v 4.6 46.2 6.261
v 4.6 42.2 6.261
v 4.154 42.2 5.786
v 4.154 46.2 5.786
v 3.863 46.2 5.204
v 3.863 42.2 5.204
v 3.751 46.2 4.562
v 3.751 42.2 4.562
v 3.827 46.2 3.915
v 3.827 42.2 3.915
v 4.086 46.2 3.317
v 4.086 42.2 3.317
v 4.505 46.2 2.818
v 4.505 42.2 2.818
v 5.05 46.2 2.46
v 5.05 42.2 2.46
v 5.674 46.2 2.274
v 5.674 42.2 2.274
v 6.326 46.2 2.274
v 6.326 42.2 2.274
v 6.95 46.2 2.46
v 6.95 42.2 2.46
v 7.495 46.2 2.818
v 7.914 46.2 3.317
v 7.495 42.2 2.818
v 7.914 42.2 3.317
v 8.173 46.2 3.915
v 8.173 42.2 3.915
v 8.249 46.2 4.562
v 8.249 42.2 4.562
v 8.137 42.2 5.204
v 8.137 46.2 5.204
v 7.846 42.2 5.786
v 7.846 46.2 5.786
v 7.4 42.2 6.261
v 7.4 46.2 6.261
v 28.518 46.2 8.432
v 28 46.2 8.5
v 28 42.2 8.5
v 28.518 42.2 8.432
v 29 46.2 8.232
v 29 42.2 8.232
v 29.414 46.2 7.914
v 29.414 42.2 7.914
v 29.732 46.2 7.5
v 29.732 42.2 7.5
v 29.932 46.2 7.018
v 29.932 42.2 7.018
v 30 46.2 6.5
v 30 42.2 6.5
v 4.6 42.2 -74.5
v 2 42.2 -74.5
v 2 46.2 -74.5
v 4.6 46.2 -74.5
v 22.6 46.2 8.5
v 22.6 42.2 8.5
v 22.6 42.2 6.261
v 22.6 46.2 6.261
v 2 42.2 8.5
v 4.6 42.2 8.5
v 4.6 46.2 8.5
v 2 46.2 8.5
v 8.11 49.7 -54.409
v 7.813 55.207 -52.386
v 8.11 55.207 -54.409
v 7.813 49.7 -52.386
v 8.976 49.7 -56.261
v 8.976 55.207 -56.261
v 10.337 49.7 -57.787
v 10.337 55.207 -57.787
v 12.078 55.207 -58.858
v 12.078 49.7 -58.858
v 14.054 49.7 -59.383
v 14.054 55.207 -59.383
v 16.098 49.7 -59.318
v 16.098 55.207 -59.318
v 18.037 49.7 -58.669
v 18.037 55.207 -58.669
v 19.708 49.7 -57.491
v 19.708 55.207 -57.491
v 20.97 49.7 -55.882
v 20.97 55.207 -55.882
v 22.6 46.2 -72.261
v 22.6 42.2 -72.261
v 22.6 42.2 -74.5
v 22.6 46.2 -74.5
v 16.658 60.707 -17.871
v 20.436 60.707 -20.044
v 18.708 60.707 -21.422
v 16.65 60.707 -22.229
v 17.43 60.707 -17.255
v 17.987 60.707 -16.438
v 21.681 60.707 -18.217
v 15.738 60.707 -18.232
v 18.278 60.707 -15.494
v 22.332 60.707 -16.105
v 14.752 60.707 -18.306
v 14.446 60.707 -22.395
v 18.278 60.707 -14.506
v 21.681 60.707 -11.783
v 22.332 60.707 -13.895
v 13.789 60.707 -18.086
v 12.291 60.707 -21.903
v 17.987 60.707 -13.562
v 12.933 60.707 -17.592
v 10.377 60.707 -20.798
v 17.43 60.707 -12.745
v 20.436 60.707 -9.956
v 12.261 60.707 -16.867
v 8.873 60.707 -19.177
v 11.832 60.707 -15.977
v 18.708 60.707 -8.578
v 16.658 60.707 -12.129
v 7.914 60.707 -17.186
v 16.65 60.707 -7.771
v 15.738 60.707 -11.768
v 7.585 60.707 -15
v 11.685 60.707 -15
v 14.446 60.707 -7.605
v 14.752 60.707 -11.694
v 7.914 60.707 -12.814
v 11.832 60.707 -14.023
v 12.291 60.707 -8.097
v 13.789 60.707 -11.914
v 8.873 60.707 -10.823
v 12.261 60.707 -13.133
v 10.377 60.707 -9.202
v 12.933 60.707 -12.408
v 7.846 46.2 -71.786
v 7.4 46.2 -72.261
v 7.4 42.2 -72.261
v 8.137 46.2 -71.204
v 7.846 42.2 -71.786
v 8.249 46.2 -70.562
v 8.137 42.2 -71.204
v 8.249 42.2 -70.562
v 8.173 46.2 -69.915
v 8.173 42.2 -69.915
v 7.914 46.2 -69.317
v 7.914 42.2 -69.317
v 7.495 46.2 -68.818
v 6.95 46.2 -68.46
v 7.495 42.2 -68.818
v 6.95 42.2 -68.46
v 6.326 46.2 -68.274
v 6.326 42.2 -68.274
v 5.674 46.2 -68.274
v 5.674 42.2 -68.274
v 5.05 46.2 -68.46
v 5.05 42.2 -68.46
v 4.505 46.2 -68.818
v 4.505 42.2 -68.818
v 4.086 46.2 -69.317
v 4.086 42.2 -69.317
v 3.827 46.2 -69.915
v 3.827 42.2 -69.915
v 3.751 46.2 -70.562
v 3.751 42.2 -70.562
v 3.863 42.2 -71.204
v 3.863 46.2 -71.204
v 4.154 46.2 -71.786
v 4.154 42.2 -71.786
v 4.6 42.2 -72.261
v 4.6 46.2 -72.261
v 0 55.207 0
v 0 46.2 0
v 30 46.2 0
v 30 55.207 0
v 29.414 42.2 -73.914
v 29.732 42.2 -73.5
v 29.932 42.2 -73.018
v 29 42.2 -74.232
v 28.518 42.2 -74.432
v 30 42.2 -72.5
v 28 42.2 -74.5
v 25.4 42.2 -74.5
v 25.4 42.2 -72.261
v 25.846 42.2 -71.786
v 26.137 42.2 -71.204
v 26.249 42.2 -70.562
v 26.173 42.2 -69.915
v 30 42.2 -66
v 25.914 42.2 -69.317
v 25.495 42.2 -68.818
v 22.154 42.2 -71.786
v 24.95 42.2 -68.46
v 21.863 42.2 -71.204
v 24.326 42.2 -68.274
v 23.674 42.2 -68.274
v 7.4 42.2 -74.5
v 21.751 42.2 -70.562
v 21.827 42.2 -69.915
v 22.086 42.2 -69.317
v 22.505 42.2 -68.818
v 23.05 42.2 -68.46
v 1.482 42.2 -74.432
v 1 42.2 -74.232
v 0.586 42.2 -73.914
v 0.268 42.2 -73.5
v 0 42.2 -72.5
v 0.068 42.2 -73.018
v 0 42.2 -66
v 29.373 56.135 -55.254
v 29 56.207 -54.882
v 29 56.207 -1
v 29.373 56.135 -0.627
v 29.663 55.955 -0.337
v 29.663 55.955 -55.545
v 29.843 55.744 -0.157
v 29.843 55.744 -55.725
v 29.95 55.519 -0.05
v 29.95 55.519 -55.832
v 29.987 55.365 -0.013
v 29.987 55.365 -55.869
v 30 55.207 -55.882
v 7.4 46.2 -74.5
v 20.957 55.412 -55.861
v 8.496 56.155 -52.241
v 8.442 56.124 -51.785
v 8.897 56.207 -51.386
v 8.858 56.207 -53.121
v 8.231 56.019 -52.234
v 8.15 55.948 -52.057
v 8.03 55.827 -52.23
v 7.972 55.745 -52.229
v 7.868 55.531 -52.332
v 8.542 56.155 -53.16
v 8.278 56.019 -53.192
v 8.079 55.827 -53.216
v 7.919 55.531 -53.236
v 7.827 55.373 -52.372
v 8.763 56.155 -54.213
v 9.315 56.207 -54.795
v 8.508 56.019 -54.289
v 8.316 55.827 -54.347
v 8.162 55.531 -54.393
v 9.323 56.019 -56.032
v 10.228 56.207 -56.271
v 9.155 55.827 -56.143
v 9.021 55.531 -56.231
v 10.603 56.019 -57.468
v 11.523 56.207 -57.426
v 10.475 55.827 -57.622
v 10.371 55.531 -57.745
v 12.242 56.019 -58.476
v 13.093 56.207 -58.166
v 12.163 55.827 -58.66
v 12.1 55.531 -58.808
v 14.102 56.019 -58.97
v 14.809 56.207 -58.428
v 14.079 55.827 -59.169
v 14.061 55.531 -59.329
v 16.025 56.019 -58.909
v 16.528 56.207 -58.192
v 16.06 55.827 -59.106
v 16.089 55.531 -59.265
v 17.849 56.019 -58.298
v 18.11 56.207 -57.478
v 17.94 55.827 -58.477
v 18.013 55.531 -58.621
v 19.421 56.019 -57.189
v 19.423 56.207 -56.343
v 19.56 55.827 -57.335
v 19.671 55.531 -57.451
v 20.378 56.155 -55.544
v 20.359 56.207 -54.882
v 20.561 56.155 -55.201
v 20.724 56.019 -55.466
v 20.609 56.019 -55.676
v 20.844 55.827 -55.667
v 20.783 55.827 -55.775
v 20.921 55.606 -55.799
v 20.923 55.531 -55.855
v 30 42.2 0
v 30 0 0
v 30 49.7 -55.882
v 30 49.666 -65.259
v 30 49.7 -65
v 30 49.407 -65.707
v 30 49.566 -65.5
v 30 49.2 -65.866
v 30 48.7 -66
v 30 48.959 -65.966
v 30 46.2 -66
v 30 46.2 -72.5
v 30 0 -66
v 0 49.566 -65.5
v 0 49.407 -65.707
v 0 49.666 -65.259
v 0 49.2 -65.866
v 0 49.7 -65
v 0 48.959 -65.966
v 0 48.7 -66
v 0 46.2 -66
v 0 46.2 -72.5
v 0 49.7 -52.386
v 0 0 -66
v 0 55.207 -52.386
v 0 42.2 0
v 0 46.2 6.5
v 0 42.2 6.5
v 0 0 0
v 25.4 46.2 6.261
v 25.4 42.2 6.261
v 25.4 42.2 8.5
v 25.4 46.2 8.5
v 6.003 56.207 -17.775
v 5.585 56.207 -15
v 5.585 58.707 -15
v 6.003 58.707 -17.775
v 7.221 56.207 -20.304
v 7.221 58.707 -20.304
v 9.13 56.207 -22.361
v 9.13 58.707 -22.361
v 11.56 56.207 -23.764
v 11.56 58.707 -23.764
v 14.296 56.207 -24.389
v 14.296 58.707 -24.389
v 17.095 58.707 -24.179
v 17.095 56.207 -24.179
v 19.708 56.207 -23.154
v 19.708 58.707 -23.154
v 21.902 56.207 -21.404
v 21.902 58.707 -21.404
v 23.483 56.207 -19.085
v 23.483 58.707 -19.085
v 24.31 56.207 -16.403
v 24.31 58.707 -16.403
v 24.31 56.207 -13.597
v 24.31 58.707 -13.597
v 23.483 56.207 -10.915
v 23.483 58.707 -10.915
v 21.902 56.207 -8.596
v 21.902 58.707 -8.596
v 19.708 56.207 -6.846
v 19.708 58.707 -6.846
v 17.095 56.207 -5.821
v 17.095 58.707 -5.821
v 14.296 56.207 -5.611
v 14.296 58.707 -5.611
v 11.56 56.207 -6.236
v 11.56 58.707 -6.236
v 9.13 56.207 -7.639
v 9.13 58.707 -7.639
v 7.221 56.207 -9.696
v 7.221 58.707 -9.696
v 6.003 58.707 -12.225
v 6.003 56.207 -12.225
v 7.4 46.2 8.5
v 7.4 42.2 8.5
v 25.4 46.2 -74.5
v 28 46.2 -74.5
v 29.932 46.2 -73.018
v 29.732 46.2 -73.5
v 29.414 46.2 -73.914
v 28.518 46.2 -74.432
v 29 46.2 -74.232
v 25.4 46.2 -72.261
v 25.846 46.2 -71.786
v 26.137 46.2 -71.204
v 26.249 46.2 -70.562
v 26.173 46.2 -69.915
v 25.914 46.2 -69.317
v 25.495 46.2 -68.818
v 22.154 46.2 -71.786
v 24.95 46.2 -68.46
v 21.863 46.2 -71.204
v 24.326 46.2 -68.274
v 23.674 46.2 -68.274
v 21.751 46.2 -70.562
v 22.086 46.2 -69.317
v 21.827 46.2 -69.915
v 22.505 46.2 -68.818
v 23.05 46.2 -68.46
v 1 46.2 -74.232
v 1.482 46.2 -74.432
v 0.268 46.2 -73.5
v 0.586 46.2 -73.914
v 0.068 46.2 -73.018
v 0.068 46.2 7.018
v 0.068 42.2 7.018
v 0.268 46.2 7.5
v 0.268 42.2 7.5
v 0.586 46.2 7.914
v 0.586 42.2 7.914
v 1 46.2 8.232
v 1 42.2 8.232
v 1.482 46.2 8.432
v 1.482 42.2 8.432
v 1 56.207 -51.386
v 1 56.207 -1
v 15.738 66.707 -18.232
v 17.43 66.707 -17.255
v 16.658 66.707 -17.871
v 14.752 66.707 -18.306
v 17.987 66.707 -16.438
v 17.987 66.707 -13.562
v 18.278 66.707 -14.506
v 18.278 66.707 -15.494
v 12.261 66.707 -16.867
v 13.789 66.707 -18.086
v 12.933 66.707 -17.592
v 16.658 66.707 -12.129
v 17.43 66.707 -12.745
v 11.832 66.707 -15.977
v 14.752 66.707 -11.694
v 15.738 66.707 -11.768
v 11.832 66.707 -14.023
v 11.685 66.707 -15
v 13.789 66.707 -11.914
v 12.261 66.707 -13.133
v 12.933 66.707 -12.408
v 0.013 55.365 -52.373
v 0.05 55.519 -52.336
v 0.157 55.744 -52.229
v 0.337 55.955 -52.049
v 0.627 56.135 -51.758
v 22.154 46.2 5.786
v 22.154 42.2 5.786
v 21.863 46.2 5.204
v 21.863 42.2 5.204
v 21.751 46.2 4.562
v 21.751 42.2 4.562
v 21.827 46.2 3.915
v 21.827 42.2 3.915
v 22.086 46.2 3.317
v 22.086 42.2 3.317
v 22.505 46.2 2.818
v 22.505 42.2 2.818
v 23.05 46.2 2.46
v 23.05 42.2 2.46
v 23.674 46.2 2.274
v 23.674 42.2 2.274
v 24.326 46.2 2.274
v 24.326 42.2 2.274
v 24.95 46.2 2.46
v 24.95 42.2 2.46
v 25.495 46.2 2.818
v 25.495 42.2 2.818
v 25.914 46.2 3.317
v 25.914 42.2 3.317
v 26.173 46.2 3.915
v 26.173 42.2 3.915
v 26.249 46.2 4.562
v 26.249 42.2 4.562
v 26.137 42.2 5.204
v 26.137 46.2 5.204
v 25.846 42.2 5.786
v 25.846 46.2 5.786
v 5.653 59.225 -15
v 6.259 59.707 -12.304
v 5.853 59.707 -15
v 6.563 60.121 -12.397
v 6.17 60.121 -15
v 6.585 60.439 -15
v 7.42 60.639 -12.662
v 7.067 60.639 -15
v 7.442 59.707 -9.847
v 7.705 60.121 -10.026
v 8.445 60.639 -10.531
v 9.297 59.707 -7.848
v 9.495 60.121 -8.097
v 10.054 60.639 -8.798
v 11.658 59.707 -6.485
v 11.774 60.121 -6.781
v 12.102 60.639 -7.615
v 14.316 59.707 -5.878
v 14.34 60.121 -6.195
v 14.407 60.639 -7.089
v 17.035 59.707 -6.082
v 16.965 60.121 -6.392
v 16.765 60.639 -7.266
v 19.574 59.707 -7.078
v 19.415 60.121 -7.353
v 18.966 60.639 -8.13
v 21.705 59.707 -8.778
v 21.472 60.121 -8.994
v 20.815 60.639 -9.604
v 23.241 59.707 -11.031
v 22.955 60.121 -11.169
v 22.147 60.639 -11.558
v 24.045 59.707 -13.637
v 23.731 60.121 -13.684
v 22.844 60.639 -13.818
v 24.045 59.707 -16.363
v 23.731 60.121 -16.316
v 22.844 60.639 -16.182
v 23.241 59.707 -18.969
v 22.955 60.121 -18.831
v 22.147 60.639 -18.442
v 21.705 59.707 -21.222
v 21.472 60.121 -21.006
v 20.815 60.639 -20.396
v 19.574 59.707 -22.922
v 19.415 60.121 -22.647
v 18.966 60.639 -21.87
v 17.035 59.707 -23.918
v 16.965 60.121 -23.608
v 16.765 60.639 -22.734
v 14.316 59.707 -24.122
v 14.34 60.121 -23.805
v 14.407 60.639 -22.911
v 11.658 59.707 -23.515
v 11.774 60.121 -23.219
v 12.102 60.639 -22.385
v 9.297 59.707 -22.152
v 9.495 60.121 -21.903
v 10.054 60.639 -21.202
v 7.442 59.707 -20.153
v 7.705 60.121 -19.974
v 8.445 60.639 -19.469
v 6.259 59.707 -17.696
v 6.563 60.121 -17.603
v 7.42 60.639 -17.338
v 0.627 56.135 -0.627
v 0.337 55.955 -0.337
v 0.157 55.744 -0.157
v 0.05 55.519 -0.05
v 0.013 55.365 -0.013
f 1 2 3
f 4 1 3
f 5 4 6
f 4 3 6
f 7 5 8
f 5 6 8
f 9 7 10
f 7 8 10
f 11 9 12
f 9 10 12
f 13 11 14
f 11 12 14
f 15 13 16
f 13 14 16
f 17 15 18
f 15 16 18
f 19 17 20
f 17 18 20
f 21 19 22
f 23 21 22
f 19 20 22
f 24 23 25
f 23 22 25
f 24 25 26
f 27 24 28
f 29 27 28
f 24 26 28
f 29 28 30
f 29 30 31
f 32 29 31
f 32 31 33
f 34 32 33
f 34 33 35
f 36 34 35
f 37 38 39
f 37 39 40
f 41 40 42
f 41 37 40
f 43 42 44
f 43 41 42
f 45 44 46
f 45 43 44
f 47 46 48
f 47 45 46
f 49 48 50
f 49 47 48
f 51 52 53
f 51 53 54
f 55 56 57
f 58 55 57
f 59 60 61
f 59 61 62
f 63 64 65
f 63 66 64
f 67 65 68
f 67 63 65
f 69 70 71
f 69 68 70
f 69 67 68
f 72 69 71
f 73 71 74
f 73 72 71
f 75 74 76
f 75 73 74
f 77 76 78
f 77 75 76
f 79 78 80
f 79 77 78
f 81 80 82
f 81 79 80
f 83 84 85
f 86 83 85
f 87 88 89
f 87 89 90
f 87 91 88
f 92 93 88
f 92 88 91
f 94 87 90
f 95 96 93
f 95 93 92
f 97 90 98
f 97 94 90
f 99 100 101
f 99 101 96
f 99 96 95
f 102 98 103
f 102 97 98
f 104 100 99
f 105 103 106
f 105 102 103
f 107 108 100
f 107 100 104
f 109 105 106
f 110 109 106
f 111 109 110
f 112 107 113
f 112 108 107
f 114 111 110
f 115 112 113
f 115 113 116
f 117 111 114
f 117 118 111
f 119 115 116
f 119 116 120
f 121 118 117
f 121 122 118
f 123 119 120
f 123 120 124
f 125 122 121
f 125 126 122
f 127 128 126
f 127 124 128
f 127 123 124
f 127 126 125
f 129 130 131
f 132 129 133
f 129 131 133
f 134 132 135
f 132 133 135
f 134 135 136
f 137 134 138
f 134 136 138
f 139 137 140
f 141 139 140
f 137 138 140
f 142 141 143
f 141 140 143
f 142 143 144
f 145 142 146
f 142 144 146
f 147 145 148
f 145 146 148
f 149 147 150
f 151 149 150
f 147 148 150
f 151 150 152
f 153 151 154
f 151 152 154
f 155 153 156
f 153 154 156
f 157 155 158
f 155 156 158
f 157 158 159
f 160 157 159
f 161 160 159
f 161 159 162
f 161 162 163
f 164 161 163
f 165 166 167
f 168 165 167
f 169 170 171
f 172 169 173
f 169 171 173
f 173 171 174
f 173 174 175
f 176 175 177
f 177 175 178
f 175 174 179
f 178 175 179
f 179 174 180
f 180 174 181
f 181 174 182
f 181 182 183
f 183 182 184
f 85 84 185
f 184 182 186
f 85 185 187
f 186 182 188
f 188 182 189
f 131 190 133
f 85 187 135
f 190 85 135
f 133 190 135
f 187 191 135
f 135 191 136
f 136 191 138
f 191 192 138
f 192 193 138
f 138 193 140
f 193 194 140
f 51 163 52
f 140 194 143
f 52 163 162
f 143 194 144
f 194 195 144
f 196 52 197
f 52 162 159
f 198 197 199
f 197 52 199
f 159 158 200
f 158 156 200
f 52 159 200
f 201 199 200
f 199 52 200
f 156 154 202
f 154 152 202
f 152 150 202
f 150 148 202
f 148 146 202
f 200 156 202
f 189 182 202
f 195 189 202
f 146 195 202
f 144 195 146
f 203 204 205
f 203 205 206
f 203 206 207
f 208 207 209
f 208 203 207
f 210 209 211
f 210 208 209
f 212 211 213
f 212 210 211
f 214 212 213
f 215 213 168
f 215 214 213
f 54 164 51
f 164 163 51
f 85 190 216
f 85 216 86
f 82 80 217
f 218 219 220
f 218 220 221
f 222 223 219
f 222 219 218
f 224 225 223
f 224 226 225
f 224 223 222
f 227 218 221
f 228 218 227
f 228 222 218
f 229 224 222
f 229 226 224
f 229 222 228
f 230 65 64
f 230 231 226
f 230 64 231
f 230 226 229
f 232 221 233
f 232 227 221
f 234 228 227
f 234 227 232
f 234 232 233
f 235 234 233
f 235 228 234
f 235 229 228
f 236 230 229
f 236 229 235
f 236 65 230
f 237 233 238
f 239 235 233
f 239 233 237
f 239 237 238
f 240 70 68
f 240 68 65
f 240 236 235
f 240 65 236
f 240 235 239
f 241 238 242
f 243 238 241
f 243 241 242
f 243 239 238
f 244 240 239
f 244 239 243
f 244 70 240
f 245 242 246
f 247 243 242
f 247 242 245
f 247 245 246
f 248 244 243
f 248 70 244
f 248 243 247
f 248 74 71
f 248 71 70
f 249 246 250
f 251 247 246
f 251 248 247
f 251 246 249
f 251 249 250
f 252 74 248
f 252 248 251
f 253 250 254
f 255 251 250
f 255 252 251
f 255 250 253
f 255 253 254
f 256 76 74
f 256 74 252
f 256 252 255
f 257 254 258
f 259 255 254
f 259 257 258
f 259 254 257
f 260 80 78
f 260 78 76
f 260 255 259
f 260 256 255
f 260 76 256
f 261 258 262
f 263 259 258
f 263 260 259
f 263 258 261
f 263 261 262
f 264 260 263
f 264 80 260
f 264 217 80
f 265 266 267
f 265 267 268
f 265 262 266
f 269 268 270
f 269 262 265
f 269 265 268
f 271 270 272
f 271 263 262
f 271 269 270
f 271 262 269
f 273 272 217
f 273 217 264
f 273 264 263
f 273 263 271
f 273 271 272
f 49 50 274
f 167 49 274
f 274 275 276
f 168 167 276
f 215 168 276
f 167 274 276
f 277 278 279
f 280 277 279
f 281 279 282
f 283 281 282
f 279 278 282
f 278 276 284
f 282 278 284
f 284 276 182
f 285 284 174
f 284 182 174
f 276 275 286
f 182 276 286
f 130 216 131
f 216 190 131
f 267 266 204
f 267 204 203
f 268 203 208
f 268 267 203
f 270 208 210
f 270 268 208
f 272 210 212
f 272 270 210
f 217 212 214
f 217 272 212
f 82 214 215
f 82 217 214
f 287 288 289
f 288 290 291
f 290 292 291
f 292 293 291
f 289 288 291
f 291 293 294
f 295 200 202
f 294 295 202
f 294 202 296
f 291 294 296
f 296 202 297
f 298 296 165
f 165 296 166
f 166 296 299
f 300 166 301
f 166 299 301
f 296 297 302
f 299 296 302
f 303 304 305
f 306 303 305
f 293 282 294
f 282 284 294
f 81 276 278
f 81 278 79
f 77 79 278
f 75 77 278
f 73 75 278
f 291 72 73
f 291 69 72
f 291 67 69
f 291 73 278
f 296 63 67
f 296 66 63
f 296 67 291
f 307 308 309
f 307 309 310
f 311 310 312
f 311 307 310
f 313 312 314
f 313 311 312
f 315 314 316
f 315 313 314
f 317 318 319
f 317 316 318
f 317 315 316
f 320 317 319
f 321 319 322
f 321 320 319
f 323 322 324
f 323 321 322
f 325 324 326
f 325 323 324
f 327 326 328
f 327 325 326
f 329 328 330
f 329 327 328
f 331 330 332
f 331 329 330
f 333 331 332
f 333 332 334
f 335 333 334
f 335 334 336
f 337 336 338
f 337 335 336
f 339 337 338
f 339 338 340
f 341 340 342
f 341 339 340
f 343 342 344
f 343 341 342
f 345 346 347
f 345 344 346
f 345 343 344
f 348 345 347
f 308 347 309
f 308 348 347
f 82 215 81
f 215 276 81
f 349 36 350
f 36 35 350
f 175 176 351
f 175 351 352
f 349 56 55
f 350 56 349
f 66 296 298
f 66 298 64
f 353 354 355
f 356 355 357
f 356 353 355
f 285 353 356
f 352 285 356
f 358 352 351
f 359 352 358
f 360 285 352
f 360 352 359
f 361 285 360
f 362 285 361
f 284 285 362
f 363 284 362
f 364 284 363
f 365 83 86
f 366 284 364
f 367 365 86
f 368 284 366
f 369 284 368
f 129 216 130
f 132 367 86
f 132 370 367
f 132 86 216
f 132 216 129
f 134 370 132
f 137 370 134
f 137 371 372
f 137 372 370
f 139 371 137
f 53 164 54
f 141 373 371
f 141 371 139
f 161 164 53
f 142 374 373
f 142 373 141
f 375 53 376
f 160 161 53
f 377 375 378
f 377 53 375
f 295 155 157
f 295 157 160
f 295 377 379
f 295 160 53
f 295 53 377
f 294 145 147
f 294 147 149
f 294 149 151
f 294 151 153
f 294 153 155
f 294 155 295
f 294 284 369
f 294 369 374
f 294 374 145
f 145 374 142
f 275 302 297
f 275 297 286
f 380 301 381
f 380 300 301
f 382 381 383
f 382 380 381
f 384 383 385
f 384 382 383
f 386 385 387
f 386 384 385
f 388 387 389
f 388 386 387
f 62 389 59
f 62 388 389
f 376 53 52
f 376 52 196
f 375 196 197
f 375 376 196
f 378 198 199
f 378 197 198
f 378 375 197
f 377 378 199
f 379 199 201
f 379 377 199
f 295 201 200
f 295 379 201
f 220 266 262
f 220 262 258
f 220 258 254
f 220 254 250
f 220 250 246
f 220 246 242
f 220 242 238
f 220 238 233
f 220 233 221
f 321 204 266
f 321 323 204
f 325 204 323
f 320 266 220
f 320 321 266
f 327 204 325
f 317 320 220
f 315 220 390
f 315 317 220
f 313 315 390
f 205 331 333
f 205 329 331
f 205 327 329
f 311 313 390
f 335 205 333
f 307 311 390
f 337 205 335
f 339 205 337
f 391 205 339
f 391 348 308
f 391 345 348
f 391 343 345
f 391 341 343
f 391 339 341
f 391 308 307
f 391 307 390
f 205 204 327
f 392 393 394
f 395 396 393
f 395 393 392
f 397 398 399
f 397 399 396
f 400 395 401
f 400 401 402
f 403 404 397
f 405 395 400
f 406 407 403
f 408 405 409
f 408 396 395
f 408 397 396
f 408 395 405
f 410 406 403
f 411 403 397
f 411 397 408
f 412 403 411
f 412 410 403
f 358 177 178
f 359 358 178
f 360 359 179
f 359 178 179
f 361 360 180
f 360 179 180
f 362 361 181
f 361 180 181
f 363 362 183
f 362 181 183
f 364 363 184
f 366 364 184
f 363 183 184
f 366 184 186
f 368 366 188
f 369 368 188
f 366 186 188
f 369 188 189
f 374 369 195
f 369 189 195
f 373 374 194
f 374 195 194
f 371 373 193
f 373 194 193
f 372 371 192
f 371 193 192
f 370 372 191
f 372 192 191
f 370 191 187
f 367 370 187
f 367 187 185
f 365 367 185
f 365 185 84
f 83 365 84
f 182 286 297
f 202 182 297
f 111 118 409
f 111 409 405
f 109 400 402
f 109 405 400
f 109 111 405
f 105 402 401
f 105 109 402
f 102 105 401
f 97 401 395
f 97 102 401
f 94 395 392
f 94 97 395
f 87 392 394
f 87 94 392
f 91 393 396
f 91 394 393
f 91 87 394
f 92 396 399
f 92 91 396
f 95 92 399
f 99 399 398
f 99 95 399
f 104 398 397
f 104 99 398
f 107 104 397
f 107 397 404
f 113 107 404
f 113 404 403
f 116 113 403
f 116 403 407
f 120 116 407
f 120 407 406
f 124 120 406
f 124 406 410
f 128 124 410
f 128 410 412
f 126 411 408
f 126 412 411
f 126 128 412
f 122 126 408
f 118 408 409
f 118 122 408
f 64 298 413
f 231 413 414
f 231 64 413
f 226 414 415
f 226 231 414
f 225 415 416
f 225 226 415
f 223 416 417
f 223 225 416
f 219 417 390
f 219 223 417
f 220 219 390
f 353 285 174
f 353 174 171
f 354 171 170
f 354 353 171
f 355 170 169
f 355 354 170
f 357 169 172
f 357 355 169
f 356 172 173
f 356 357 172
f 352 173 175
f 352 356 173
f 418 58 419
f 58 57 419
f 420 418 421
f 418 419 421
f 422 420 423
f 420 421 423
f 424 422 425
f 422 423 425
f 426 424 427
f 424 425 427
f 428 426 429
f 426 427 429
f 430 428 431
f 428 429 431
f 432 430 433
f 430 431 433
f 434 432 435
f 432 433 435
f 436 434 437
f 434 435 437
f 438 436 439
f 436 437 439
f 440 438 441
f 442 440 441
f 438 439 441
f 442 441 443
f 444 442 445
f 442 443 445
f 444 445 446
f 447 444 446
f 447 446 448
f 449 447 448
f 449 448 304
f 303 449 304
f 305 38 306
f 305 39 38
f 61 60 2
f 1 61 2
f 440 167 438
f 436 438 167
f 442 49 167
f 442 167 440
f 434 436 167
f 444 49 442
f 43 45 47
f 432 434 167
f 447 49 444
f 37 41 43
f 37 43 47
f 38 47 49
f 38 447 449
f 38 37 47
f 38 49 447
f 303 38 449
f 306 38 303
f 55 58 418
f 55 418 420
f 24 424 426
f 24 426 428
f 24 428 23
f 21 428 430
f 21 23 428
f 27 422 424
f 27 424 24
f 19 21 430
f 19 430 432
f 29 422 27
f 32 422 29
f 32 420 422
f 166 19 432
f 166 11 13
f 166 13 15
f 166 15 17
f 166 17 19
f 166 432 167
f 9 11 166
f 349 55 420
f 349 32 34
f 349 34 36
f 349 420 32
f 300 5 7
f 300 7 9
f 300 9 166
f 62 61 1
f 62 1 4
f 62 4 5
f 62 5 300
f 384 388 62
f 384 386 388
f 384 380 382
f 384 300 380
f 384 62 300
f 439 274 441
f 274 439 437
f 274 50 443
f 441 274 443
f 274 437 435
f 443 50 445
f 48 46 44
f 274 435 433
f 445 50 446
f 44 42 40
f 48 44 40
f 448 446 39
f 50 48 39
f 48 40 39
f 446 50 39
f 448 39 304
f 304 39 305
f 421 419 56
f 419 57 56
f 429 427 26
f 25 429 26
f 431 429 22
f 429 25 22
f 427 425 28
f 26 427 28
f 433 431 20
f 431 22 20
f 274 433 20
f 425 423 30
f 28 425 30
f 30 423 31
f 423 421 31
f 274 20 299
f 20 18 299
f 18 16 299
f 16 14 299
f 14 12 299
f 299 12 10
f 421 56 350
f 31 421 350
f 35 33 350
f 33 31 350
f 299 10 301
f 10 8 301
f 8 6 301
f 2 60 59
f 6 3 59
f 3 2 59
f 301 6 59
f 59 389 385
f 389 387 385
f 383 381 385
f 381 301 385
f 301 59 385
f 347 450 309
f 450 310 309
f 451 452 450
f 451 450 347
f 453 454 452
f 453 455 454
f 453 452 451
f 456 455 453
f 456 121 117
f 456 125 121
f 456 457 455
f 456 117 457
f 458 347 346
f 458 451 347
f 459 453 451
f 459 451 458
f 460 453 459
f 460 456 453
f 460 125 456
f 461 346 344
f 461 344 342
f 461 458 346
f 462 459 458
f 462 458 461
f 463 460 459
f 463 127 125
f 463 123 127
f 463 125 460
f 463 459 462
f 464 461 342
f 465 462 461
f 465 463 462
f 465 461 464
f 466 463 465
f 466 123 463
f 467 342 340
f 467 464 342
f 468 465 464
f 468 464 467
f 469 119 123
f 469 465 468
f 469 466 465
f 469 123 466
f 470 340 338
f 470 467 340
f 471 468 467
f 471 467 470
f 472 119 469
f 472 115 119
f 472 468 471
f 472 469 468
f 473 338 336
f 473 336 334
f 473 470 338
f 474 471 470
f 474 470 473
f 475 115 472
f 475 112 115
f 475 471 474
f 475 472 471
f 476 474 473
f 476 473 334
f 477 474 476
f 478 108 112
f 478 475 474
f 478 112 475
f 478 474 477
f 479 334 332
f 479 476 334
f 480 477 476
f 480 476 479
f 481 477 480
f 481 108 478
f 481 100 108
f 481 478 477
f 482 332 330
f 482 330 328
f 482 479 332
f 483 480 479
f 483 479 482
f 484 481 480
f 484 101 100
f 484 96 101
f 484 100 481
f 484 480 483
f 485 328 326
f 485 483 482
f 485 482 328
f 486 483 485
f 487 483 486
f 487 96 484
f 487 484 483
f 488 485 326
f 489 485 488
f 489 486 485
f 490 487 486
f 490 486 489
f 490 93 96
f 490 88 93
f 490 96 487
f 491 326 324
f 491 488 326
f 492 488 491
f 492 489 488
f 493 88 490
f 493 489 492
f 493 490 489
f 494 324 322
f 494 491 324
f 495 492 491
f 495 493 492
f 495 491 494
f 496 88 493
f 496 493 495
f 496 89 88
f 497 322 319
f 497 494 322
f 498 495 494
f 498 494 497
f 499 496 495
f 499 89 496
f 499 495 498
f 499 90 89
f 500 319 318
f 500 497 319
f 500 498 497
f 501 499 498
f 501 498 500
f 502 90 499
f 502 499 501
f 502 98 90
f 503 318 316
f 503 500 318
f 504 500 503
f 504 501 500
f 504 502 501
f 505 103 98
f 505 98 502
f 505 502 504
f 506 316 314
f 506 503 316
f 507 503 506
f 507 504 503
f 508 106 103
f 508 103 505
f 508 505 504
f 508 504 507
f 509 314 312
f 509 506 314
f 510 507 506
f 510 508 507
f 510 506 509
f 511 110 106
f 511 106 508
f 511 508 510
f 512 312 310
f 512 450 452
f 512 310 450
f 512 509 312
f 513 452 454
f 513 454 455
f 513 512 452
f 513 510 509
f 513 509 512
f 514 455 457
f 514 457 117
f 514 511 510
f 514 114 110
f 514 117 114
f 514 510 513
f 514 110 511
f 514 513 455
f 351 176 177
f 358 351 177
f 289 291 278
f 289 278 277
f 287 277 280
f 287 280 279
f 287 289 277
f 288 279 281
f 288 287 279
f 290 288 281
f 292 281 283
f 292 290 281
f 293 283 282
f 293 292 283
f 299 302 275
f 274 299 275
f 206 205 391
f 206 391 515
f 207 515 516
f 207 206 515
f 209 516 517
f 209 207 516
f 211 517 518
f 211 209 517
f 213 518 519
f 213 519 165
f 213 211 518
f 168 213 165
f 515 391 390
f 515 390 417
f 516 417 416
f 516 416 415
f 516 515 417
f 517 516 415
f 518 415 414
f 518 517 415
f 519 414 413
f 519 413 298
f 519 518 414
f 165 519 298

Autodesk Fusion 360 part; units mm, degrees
sketch "Skizze1" plane through (0, 0, 0) normal (0, 1, 0) x (1, 0, 0)
  line L0 (0, 0) -> (30, 0)
  line L1 (30, 0) -> (30, 66)
  line L2 (30, 66) -> (0, 66)
  line L3 (0, 66) -> (0, 0)
  dimension "d5" = 30
  dimension "d6" = 66
extrude "Extrusion2" add sketch "Skizze1" along normal blind 42.2
sketch "Skizze2" plane through (0, 42.2, 0) normal (0, 1, 0) x (-1, 0, 0)
  line L0 (0, -66) -> (0, 0)
  line L1 (0, 0) -> (-30, 0)
  line L2 (-30, 0) -> (-30, -66)
  line L3 (-30, -66) -> (0, -66)
  line L4 (0, -74.5) -> (-30, -74.5)
  line L5 (-30, -74.5) -> (-30, 8.5)
  line L6 (-30, 8.5) -> (0, 8.5)
  line L7 (0, 8.5) -> (0, -74.5)
  line L8 (-30, -66) -> (0, 0) construction
  line L9 (0, -74.5) -> (-30, 8.5) construction
  line L10 (-15, -33) -> (-15, -70.5) construction
  line L11 (-15, -70.5) -> (-6, -70.5) construction
  circle A0 centre (-6, -70.5) radius 2.25
  circle A1 centre (-24, -70.5) radius 2.25
  circle A2 centre (-6, 4.5) radius 2.25
  circle A3 centre (-24, 4.5) radius 2.25
  line L12 (-4.6, -74.5) -> (-7.4, -74.5)
  line L13 (-7.4, -74.5) -> (-7.4, -71.5)
  line L14 (-7.4, -71.5) -> (-4.6, -71.5)
  line L15 (-4.6, -71.5) -> (-4.6, -74.5)
  line L16 (-6, -71.5) -> (-6, -70.5) construction
  line L17 (-25.4, -74.5) -> (-25.4, -71.5)
  line L18 (-22.6, -74.5) -> (-25.4, -74.5)
  line L19 (-22.6, -71.5) -> (-22.6, -74.5)
  line L20 (-25.4, -71.5) -> (-22.6, -71.5)
  line L21 (-7.4, 5.5) -> (-7.4, 8.5)
  line L22 (-4.6, 5.5) -> (-7.4, 5.5)
  line L23 (-4.6, 8.5) -> (-4.6, 5.5)
  line L24 (-7.4, 8.5) -> (-4.6, 8.5)
  line L25 (-25.4, 5.5) -> (-25.4, 8.5)
  line L26 (-22.6, 5.5) -> (-25.4, 5.5)
  line L27 (-22.6, 8.5) -> (-22.6, 5.5)
  line L28 (-25.4, 8.5) -> (-22.6, 8.5)
  point P0 (-15, -33)
  dimension "d9" = 30
  dimension "d10" = 83
  dimension "d13" = 9
  dimension "d14" = 37.5
  dimension "d15" = 4.5
  dimension "d18" = -18
  dimension "d19" = 75
  dimension "d20" = 2.8
  dimension "d21" = 3
  dimension "d24" = -18
  dimension "d25" = 80
extrude "Extrusion3" add sketch "Skizze2" along normal blind 4 contours L0 L1 L2 L3 L5 L7 | L3 L4 L5 L7 A0 A1 L13 L15 L17 L19 | L1 L5 L6 L7 A2 A3 L21 L23 L25 L27
sketch "Skizze3" plane through (0, 46.2, 0) normal (0, 1, 0) x (-1, 0, 0)
  line L0 (-7.4, 6.2614) -> (-7.4, 8.5)
  line L1 (-7.4, 8.5) -> (-22.6, 8.5)
  line L2 (-22.6, 8.5) -> (-22.6, 6.2614)
  arc A0 (-25.4, 6.2614) -> (-22.6, 6.2614) centre (-24, 4.5) ccw
  line L3 (-25.4, 6.2614) -> (-25.4, 8.5)
  line L4 (-25.4, 8.5) -> (-30, 8.5)
  line L5 (-30, 8.5) -> (-30, -74.5)
  line L6 (-30, -74.5) -> (-25.4, -74.5)
  line L7 (-25.4, -74.5) -> (-25.4, -72.2614)
  arc A1 (-22.6, -72.2614) -> (-25.4, -72.2614) centre (-24, -70.5) ccw
  line L8 (-22.6, -72.2614) -> (-22.6, -74.5)
  line L9 (-22.6, -74.5) -> (-7.4, -74.5)
  line L10 (-7.4, -74.5) -> (-7.4, -72.2614)
  arc A2 (-4.6, -72.2614) -> (-7.4, -72.2614) centre (-6, -70.5) ccw
  line L11 (-4.6, -72.2614) -> (-4.6, -74.5)
  line L12 (-4.6, -74.5) -> (0, -74.5)
  line L13 (0, -74.5) -> (0, 8.5)
  line L14 (0, 8.5) -> (-4.6, 8.5)
  line L15 (-4.6, 8.5) -> (-4.6, 6.2614)
  arc A3 (-7.4, 6.2614) -> (-4.6, 6.2614) centre (-6, 4.5) ccw
  line L16 (-30, -66) -> (0, -66)
  line L17 (0, 0) -> (-30, 0)
  line L18 (0, -66) -> (-30, -66)
  line L19 (-30, 0) -> (0, 0)
extrude "Extrusion4" add sketch "Skizze3" along normal blind 3.5 contours L5 L13 L16 L17 L18 L19
fillet "Abrundung1" radius 2 4 edges at (30, 44.2, -74.5) (0, 44.2, -74.5) (30, 44.2, 8.5) (0, 44.2, 8.5)
sketch "Skizze4" plane through (0, 49.7, 0) normal (0, 1, 0) x (-1, 0, 0)
  line L0 (0, -66) -> (0, 0)
  line L1 (0, 0) -> (-30, 0)
  line L2 (-30, 0) -> (-30, -66)
  line L3 (-30, -66) -> (0, -66)
  line L4 (-30, -66) -> (0, -66)
  line L5 (0, -66) -> (0, 0)
  line L6 (-30, 0) -> (-30, -66)
  line L7 (0, 0) -> (-30, 0)
  line L8 (0, -52.3857) -> (-7.8134, -52.3857)
  line L9 (-30, -55.8819) -> (-20.9697, -55.8819)
  arc A0 (-20.9697, -55.8819) -> (-7.8134, -52.3857) centre (-14.8561, -52.3857) ccw
  line L10 (-30, -66) -> (0, -66)
  line L11 (0, -66) -> (0, 0)
  line L12 (-30, 0) -> (-30, -66)
  dimension "d31" = 13.6143
  dimension "d32" = 10.1181
  dimension "d33" = 7.8134
  dimension "d35" = 9.0303
extrude "Extrusion5" add sketch "Skizze4" along normal blind 6.507 contours L0 L1 L2 L5 L6 L7 L8 L9 A0 L11 L12
sketch "Skizze5" plane through (0, 56.207, 0) normal (0, 1, 0) x (-1, 0, 0)
  line L0 (0, -52.3857) -> (0, 0)
  line L1 (0, 0) -> (-30, 0)
  line L2 (-30, 0) -> (-30, -55.8819)
  line L3 (-30, -55.8819) -> (-20.9697, -55.8819)
  arc A0 (-20.9697, -55.8819) -> (-7.8134, -52.3857) centre (-14.8561, -52.3857) ccw
  line L4 (-7.8134, -52.3857) -> (0, -52.3857)
  circle A1 centre (-15, -15) radius 9.4153
  line L5 (-30, 0) -> (-30, -66)
  line L6 (0, 0) -> (-30, 0)
  dimension "d39" = 15
  dimension "d40" = 15
  dimension "d41" = 18.8307
extrude "Extrusion6" add sketch "Skizze5" along normal blind 4.5 contours A1
sketch "Skizze6" plane through (0, 60.707, 0) normal (0, 1, 0) x (-1, 0, 0)
  circle A0 centre (-15, -15) radius 9.4153
  circle A1 centre (-15, -15) radius 9.4153
  circle A2 centre (-15, -15) radius 3.315
  dimension "d45" = 6.63
extrude "Extrusion7" add sketch "Skizze6" along normal blind 6 contours A2
fillet "Abrundung3" radius 2 1 edges at (23.7782, 60.707, -18.4047)
fillet "Abrundung2" radius 1 7 edges at (13.0473, 56.207, -59.1921) (3.9067, 56.207, -52.3857) (25.4848, 56.207, -55.8819) (15, 49.7, -66) (15, 56.207, 0) (30, 56.207, -27.9409) (0, 56.207, -26.1929)
equation "d13 = ( 18 / 2 ) * 1 mm"
equation "d14 = ( 75 / 2 ) * 1 mm"
